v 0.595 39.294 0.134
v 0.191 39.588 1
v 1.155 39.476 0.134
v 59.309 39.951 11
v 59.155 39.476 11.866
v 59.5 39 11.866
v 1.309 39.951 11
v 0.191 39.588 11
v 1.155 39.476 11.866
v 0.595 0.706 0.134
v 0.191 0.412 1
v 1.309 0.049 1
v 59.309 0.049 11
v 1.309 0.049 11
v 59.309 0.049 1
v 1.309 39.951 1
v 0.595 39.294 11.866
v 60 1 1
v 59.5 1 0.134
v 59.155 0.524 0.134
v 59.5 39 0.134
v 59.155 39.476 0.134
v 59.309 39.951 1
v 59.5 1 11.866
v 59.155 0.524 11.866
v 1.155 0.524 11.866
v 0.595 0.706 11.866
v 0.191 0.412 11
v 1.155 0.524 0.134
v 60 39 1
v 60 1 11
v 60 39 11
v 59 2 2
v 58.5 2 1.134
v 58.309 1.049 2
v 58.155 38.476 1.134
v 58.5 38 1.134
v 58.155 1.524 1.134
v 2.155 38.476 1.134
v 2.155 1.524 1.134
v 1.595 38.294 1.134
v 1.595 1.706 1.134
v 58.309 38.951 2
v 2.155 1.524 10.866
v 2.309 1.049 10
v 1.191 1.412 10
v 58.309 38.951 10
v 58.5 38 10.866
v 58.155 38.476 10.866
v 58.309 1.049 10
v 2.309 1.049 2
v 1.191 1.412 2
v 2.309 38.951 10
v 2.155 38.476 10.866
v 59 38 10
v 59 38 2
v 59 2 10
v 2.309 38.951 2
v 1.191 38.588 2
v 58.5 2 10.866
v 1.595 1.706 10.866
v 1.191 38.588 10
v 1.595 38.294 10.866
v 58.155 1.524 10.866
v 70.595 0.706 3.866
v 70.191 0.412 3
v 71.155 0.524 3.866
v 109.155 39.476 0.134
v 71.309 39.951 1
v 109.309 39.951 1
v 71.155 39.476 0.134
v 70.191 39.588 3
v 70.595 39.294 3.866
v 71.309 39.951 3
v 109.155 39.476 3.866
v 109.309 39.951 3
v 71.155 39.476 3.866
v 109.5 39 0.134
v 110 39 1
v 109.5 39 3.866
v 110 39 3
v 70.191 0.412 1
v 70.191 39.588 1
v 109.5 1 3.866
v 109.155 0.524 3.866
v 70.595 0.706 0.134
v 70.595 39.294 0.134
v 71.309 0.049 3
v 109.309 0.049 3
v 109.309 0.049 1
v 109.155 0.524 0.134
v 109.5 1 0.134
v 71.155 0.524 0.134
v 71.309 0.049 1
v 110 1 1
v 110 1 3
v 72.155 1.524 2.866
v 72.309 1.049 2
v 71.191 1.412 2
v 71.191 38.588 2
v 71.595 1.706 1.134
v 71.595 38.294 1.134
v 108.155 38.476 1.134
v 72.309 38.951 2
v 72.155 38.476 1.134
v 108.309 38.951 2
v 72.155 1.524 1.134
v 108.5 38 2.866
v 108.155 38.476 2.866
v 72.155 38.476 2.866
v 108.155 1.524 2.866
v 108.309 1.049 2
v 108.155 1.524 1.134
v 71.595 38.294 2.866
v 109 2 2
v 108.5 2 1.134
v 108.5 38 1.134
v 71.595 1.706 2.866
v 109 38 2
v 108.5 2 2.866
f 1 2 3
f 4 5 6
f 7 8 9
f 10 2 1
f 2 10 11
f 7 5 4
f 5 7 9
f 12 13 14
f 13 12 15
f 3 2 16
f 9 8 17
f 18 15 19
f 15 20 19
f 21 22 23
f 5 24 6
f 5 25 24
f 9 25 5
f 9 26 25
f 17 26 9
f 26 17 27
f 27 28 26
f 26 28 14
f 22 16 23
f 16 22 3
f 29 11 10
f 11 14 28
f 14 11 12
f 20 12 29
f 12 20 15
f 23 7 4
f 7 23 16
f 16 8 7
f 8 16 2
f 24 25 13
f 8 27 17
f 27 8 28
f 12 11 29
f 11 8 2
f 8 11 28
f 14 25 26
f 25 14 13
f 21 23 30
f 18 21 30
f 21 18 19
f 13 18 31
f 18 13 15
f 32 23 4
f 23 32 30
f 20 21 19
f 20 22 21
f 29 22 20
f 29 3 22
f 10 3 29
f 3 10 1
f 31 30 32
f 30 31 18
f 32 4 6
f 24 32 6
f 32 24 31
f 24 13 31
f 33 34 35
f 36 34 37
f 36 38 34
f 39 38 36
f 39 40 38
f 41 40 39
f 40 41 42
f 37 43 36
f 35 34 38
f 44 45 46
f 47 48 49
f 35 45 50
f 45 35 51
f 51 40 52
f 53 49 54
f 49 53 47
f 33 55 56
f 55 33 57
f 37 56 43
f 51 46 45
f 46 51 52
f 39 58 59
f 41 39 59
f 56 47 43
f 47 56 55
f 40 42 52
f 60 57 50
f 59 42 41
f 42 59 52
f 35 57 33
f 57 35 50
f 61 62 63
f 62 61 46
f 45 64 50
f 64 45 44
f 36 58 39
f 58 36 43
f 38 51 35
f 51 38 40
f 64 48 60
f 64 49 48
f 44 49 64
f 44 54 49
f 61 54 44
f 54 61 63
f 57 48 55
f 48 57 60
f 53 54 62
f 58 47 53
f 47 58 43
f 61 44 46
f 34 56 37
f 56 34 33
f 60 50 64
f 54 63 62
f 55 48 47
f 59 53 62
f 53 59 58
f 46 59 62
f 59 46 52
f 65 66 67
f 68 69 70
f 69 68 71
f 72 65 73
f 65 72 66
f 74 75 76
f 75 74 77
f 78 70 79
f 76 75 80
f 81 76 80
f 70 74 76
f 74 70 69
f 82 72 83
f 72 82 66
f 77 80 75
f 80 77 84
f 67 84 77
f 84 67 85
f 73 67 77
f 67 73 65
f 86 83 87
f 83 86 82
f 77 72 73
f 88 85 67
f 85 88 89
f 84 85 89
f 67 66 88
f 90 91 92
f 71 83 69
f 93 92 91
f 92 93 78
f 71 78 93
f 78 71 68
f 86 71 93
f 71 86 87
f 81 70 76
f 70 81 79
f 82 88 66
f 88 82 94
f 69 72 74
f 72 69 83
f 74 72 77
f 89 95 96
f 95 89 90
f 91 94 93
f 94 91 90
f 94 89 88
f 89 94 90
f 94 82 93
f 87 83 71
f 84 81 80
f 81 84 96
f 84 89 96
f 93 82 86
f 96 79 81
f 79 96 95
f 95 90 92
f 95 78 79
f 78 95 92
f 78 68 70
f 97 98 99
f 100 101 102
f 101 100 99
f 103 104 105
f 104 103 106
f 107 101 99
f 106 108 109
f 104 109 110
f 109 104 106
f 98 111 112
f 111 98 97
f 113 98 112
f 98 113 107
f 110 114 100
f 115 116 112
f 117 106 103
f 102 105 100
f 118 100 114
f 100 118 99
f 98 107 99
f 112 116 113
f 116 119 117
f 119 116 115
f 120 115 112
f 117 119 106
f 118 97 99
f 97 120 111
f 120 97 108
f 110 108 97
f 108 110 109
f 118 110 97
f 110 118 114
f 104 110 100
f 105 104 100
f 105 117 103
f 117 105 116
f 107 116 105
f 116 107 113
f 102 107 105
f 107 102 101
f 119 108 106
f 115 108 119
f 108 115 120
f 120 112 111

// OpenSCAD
module hollowBoxWithRoundedCorners(height, width, length, wall_thickness, corner_radius) {
    difference() {
        // Outer rounded box
        hull() {
            for (x = [0, length - corner_radius * 2])
                for (y = [0, width - corner_radius * 2])
                    for (z = [0, height - corner_radius * 2])
                        translate([x + corner_radius, y + corner_radius, z + corner_radius])
                            sphere(corner_radius);
        }

        // Inner cavity to make the box hollow
        translate([wall_thickness, wall_thickness, wall_thickness])
        hull() {
            for (x = [0, length - wall_thickness * 2 - corner_radius * 2])
                for (y = [0, width - wall_thickness * 2 - corner_radius * 2])
                    for (z = [0, height - wall_thickness * 2 - corner_radius * 2])
                        translate([x + corner_radius, y + corner_radius, z + corner_radius])
                            sphere(corner_radius);
        }

        // Removing the bottom
        translate([-1, -1, -1])
        cube([length + 2, width + 2, wall_thickness]);
    }
}

// First box without bottom
hollowBoxWithRoundedCorners(12, 40, 60, 1, 1);

translate([70, 0, 0]) // Move the second box to avoid overlap
// Second box without bottom
hollowBoxWithRoundedCorners(4, 40, 40, 1, 1);
